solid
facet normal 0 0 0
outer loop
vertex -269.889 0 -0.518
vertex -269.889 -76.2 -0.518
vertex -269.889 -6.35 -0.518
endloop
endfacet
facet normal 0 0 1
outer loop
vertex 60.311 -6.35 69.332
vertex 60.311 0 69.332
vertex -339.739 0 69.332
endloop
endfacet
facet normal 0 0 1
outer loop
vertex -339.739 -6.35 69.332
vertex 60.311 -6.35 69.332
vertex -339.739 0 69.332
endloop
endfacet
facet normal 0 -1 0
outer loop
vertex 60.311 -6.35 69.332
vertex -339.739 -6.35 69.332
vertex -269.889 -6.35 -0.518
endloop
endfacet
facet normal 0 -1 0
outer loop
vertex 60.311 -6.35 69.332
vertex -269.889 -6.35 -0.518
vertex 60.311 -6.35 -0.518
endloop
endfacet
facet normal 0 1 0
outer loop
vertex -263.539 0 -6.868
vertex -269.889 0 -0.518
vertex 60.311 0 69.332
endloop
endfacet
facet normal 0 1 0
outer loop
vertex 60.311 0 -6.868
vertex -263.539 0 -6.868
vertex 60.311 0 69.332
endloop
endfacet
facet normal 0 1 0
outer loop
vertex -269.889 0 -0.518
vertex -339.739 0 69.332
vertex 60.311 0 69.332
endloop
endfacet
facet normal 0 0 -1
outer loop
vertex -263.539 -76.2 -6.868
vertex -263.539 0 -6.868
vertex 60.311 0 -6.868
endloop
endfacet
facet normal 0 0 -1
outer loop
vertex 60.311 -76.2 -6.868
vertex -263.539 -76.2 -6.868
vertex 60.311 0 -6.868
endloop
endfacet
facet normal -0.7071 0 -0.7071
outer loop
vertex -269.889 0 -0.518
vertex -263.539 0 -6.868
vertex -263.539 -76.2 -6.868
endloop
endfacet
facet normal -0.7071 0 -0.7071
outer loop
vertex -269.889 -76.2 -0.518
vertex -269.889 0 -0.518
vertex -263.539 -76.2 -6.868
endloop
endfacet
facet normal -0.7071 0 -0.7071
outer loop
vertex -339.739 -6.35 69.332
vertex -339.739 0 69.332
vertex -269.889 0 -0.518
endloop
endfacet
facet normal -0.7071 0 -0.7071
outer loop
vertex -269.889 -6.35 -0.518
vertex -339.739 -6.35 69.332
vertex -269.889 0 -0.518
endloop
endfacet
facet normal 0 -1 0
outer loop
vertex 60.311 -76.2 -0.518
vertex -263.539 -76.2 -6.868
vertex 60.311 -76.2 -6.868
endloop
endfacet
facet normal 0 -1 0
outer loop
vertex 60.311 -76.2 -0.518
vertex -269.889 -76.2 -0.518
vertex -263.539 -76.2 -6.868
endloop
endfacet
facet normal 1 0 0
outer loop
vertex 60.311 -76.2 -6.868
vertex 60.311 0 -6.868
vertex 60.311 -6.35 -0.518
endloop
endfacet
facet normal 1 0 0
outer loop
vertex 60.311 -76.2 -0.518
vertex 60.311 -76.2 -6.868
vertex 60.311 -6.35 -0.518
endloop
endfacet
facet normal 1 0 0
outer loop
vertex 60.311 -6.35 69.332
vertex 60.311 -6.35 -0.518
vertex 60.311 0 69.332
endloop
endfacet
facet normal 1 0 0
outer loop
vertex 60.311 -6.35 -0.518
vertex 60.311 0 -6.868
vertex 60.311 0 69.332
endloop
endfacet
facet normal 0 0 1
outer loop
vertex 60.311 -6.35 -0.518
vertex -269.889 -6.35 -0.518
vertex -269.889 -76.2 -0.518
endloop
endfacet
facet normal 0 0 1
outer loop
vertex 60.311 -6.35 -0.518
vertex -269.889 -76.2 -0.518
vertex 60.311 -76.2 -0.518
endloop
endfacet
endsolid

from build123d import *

# Parameters (mm, degrees)
F1_DEPTH = 6.35
F0_W     = 330.2
F0_H     = 6.35
F2_DEPTH = 76.2
F3_SIZE  = 6.34999


# Not quite as in the source:
# - a fillet or chamfer is up to 0.001 mm smaller than in the source, because OpenCascade refuses the exact size


with BuildPart() as f1:
    # F0 (on Front) → F1 (new body)
    with BuildSketch(Plane.XZ):
        Polygon((-339.7388204469, 69.3321084814), (-269.8888204469, -0.5178915186), (60.3111795531, -0.5178915186), (60.3111795531, 69.3321084814), align=None)
    extrude(amount=F1_DEPTH)

    # F0 (on Front) → F2 (join)
    with BuildSketch(Plane.XZ):
        with Locations((-104.7888204469, -3.6928915186)):
            Rectangle(F0_W, F0_H)
    extrude(amount=F2_DEPTH)

    # F3 (size 6.35 in the source; OpenCascade refuses exactly that, so slightly less here)
    f3_edges = [f1.edges().sort_by_distance(p)[0] for p in [
        (-269.88882, -38.1, -6.867892),
    ]]
    chamfer(f3_edges, length=F3_SIZE)


solid = f1.part
